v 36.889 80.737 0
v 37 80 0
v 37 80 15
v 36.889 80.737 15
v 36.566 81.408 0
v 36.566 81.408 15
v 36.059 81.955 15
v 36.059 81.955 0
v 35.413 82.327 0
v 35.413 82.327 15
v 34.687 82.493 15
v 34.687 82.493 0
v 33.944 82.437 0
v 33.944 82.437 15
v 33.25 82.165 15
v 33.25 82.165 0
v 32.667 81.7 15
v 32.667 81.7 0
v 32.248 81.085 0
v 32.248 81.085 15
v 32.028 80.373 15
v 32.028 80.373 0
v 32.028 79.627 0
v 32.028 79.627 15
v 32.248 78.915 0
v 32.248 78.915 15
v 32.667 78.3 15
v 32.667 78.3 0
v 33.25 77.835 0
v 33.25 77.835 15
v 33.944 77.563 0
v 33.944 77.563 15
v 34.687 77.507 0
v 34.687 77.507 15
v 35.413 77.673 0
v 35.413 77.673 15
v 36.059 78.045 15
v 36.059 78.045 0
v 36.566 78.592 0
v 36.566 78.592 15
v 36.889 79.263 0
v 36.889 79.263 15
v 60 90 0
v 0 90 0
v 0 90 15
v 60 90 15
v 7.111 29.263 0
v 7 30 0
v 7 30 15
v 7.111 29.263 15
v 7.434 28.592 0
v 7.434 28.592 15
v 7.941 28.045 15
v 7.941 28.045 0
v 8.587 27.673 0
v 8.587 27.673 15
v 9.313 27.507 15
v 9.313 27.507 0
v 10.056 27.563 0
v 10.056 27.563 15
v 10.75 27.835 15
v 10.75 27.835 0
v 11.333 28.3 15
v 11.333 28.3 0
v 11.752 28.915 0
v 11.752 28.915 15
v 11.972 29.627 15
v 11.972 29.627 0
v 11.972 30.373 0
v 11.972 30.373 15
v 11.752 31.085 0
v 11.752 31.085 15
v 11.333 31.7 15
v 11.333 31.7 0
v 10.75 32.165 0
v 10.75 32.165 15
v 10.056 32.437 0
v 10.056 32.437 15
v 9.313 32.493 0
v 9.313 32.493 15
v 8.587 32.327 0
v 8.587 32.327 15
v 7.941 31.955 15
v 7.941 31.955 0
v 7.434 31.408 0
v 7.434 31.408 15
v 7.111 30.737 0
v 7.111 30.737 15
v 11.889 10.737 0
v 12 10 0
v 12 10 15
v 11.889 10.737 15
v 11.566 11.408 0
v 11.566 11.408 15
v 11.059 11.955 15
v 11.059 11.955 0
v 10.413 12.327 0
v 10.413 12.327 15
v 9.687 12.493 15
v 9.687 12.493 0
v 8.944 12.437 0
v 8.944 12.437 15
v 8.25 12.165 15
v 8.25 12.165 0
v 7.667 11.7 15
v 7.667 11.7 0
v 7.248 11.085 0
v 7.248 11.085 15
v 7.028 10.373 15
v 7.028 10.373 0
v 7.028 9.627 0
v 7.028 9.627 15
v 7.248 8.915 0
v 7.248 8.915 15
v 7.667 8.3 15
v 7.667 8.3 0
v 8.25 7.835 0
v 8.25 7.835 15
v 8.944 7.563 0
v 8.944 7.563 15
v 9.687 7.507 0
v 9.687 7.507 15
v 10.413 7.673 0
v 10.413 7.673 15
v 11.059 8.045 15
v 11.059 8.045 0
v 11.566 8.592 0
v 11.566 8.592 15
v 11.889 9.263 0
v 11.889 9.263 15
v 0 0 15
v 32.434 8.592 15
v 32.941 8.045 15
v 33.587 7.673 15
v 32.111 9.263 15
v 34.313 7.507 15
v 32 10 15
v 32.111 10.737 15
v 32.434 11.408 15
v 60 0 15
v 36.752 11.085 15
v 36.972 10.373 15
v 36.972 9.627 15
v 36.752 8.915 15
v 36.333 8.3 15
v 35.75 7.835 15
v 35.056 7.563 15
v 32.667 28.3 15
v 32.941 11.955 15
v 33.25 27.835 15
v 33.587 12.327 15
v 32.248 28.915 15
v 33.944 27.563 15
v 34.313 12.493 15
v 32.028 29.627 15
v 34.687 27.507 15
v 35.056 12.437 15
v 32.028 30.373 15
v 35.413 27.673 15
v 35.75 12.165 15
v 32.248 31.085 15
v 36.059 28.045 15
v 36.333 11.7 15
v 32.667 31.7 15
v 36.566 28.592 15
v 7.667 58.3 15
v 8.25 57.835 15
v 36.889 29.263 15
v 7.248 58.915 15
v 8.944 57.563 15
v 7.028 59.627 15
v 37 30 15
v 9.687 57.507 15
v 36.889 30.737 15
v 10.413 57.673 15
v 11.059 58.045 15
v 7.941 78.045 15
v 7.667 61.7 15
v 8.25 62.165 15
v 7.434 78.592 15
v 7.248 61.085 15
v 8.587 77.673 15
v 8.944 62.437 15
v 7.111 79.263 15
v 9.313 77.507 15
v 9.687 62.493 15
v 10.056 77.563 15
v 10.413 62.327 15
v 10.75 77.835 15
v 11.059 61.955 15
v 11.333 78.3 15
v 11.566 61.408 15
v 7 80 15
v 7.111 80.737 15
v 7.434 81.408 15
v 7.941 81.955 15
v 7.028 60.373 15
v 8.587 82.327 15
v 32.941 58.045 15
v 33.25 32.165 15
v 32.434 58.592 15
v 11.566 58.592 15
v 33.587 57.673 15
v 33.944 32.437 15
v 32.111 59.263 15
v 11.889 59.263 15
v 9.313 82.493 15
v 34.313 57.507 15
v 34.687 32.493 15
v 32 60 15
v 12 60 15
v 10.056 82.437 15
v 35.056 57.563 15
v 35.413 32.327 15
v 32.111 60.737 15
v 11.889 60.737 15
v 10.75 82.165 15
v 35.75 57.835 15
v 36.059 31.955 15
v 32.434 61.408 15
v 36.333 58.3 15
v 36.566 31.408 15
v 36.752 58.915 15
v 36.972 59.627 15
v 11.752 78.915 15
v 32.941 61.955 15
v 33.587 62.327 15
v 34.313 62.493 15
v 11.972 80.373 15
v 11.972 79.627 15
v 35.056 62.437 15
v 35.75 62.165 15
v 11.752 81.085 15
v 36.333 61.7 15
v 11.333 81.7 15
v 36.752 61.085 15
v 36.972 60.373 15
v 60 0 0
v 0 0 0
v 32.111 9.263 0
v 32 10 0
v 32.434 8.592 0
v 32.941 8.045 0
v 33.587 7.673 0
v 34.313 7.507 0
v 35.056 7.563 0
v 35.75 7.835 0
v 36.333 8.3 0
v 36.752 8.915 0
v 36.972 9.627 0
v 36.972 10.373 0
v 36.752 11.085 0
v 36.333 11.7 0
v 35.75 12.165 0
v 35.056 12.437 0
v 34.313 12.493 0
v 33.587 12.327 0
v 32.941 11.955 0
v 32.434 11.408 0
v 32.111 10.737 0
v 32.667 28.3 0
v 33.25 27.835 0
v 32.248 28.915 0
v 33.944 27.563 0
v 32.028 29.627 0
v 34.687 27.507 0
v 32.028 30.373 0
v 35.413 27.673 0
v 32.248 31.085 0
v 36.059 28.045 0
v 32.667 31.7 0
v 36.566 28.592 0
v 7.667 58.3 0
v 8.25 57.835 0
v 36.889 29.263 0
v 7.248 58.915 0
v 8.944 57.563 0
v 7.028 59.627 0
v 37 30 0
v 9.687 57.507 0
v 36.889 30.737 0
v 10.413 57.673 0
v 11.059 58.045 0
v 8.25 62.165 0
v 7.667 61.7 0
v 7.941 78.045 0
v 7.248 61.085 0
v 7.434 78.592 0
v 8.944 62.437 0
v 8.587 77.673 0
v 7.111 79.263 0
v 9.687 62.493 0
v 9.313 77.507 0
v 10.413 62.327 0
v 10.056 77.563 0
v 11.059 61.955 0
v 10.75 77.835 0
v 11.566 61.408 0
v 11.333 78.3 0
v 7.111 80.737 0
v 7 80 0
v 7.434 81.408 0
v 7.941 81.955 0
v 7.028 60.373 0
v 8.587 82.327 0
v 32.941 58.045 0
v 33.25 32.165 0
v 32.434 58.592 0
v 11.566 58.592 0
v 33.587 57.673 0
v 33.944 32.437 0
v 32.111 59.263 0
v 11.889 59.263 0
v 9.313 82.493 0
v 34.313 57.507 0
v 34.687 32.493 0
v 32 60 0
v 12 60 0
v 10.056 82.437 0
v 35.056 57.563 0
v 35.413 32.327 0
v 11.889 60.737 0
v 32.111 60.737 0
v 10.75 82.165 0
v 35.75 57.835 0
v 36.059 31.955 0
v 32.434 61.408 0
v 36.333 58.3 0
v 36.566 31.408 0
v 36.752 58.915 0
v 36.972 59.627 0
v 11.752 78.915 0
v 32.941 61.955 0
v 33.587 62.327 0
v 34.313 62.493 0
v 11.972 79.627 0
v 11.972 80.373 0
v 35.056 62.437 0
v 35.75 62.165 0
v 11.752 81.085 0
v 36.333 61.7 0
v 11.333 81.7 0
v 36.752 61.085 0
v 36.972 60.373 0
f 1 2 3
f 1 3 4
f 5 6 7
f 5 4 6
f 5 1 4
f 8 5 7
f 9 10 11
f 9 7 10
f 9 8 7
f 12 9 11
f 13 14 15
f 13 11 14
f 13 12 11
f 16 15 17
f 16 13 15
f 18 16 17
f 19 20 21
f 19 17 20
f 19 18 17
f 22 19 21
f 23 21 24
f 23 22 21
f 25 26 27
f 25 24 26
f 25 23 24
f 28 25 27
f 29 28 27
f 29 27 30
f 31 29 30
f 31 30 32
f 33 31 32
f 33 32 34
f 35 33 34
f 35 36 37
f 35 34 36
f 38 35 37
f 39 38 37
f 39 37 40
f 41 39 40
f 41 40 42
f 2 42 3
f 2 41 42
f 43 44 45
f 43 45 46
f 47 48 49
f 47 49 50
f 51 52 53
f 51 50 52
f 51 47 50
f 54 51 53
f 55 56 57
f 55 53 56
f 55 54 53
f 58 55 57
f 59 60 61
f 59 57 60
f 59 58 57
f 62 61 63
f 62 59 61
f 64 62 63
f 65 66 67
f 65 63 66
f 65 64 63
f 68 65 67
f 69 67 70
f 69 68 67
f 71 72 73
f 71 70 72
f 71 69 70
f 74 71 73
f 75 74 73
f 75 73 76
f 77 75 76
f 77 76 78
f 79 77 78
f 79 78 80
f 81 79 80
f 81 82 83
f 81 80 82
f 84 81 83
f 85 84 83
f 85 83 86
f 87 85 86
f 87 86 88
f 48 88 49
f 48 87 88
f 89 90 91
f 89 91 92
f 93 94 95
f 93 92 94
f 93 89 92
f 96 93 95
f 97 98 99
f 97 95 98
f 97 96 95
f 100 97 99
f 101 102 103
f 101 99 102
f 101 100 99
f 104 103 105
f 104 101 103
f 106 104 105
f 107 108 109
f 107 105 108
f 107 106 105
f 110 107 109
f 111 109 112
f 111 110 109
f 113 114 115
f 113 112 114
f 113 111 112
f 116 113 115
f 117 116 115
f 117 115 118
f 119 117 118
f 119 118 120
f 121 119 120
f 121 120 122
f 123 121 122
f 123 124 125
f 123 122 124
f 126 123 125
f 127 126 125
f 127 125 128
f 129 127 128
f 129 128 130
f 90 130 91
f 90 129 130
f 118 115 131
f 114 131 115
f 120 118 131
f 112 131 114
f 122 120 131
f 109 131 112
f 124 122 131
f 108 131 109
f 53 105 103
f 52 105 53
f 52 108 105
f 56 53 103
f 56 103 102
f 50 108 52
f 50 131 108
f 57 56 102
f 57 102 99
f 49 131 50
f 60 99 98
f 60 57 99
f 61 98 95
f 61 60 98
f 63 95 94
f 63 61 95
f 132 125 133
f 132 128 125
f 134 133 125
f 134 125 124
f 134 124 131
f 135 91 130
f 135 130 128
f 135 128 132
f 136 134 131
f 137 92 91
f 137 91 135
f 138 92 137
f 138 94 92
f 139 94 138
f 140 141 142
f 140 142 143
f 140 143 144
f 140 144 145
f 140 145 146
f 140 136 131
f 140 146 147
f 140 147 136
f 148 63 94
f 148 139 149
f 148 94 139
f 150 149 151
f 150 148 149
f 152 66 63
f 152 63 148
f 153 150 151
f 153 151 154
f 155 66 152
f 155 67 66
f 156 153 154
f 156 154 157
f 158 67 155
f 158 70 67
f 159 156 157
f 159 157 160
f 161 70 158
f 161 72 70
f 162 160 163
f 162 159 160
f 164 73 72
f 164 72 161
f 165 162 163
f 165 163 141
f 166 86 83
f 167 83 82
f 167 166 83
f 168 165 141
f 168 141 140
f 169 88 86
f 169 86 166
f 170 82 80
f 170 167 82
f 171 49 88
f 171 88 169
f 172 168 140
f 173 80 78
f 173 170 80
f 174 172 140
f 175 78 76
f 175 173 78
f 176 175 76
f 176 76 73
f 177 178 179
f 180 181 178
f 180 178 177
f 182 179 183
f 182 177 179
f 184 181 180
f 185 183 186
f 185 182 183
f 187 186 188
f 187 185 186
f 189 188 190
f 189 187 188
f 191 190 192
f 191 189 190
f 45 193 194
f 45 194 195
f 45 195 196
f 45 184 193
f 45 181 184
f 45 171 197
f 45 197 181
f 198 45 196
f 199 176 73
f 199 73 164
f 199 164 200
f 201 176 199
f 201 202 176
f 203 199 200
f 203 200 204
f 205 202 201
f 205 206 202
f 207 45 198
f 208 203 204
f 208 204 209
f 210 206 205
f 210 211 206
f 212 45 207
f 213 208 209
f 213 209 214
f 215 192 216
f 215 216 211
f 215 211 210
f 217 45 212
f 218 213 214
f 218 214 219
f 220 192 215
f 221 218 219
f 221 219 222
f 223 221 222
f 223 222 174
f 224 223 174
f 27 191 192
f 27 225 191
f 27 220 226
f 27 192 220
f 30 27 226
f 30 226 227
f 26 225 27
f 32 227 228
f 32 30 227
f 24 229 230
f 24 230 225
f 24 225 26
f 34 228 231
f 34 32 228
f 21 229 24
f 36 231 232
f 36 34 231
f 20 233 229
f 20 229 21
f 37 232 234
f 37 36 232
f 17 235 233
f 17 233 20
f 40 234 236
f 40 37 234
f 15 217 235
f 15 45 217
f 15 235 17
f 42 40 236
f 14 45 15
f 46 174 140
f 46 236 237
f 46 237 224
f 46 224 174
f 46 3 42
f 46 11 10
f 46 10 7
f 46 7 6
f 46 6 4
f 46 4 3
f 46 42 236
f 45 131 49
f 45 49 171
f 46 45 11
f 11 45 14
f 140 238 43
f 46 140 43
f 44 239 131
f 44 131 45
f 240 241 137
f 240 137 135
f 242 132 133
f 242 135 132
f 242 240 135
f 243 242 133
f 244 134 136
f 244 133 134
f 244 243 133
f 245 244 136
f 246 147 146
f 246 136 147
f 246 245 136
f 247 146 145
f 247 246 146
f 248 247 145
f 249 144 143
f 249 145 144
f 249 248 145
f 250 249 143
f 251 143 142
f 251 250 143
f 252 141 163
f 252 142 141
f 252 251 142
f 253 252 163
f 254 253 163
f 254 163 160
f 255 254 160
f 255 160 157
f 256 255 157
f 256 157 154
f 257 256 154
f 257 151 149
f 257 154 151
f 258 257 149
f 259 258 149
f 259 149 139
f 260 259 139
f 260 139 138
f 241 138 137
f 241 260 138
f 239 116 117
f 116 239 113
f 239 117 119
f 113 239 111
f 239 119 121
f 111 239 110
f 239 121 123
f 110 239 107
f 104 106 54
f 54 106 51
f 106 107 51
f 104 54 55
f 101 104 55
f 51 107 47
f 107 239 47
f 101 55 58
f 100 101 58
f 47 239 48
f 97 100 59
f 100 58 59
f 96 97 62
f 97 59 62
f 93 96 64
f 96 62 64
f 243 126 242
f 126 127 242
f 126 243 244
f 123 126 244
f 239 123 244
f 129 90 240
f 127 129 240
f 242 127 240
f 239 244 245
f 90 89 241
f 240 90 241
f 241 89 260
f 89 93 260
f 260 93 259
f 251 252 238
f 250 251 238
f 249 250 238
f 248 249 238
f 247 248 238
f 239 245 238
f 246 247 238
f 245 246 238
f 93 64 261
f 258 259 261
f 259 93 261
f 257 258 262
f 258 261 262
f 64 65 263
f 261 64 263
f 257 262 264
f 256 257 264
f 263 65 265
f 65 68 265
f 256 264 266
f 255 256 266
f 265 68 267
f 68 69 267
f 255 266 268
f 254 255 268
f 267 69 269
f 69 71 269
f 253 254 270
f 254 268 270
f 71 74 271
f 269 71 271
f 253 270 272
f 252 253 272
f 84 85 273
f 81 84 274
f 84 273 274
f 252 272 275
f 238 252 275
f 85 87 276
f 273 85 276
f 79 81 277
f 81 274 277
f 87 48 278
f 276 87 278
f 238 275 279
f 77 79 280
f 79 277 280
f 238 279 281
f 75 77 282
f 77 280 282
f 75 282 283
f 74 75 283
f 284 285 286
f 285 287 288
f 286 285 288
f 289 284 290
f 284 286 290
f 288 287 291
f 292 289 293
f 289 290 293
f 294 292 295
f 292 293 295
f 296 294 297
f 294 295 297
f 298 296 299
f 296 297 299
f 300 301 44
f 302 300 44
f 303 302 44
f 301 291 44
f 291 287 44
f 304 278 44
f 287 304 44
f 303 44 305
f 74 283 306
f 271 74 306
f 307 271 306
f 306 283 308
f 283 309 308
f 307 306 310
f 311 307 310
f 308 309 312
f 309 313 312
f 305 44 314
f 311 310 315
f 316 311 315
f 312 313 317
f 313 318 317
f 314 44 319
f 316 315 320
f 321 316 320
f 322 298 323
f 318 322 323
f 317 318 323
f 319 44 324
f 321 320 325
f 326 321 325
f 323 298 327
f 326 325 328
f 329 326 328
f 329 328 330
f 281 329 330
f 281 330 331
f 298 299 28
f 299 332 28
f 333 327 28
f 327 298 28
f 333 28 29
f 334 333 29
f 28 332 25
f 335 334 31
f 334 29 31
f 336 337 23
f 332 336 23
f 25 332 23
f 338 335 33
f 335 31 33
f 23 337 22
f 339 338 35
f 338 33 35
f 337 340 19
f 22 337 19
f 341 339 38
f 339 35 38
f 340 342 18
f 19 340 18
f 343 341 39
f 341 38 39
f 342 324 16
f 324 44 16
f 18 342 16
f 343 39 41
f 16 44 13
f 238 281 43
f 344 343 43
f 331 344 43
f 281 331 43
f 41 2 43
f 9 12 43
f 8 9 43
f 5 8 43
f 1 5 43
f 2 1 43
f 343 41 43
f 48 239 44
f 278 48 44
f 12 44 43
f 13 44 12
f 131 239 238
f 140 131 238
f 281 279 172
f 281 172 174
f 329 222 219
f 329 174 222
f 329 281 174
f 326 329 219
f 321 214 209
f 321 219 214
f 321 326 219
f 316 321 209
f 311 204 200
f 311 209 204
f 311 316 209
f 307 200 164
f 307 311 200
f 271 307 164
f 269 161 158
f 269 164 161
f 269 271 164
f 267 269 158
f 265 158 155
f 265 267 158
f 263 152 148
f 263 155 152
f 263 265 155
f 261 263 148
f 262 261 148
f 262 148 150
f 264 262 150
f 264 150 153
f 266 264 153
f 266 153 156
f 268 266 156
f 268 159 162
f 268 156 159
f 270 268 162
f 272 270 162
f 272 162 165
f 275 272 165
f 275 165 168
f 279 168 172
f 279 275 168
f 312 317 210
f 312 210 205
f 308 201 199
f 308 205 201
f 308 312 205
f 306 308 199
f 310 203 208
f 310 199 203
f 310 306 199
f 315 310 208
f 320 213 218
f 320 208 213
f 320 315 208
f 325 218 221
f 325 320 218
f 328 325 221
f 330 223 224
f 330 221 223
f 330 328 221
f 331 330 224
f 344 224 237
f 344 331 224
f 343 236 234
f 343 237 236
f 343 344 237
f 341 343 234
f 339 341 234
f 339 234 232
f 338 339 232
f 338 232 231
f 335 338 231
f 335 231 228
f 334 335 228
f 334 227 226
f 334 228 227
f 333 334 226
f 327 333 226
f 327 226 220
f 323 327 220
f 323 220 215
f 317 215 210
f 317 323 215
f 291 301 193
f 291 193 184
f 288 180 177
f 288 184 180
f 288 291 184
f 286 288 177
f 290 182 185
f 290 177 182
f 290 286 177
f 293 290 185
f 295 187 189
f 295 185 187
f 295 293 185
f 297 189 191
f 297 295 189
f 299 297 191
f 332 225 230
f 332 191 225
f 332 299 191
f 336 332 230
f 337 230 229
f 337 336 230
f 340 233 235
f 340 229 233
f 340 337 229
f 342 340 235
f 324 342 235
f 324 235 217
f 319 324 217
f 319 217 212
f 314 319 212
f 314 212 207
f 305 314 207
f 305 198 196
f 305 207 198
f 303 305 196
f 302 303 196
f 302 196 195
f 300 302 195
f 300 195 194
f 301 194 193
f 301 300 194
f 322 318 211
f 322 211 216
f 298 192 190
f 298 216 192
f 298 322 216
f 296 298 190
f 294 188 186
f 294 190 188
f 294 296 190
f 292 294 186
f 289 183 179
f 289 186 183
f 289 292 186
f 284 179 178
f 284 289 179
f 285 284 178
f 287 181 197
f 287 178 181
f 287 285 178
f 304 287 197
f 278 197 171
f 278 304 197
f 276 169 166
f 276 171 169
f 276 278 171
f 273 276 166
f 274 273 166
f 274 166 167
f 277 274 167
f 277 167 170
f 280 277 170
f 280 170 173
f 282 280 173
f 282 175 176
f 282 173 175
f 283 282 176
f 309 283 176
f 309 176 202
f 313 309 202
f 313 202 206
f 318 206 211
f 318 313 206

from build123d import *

# Parameters (mm, degrees)
ESQUISSE1_W                  = 60
ESQUISSE1_H                  = 90
BOSS_EXTRU_1_DEPTH           = 15
ENL_V_MAT_EXTRU_1_DEPTH      = 110.201648339
ENL_V_MAT_EXTRU_1_DEPTH_BACK = 110.201648339
ESQUISSE2_R                  = 2.5


with BuildPart() as part:
    # Esquisse1 → Boss.-Extru.1 (new body)
    with BuildSketch(Plane.XY):
        with Locations((30, 45)):
            Rectangle(ESQUISSE1_W, ESQUISSE1_H)
    extrude(amount=BOSS_EXTRU_1_DEPTH)

    # Esquisse2 → Enlèv. mat.-Extru.1 (cut, two sides: drawn at the far end of the back side and taken through both)
    with BuildSketch(Plane.XY.offset(15).offset(-ENL_V_MAT_EXTRU_1_DEPTH_BACK)):
        with Locations((9.5, 10)):
            Circle(ESQUISSE2_R)
        with Locations(Location((34.5, 10, 0), (0, 0, 180))):
            Circle(ESQUISSE2_R)
        with Locations((34.5, 30)):
            Circle(ESQUISSE2_R)
        with Locations(Location((9.5, 30, 0), (0, 0, 180))):
            Circle(ESQUISSE2_R)
        with Locations((9.5, 60)):
            Circle(ESQUISSE2_R)
        with Locations(Location((34.5, 60, 0), (0, 0, 180))):
            Circle(ESQUISSE2_R)
        with Locations((34.5, 80)):
            Circle(ESQUISSE2_R)
        with Locations(Location((9.5, 80, 0), (0, 0, 180))):
            Circle(ESQUISSE2_R)
    extrude(amount=ENL_V_MAT_EXTRU_1_DEPTH + ENL_V_MAT_EXTRU_1_DEPTH_BACK, mode=Mode.SUBTRACT)


solid = part.part
